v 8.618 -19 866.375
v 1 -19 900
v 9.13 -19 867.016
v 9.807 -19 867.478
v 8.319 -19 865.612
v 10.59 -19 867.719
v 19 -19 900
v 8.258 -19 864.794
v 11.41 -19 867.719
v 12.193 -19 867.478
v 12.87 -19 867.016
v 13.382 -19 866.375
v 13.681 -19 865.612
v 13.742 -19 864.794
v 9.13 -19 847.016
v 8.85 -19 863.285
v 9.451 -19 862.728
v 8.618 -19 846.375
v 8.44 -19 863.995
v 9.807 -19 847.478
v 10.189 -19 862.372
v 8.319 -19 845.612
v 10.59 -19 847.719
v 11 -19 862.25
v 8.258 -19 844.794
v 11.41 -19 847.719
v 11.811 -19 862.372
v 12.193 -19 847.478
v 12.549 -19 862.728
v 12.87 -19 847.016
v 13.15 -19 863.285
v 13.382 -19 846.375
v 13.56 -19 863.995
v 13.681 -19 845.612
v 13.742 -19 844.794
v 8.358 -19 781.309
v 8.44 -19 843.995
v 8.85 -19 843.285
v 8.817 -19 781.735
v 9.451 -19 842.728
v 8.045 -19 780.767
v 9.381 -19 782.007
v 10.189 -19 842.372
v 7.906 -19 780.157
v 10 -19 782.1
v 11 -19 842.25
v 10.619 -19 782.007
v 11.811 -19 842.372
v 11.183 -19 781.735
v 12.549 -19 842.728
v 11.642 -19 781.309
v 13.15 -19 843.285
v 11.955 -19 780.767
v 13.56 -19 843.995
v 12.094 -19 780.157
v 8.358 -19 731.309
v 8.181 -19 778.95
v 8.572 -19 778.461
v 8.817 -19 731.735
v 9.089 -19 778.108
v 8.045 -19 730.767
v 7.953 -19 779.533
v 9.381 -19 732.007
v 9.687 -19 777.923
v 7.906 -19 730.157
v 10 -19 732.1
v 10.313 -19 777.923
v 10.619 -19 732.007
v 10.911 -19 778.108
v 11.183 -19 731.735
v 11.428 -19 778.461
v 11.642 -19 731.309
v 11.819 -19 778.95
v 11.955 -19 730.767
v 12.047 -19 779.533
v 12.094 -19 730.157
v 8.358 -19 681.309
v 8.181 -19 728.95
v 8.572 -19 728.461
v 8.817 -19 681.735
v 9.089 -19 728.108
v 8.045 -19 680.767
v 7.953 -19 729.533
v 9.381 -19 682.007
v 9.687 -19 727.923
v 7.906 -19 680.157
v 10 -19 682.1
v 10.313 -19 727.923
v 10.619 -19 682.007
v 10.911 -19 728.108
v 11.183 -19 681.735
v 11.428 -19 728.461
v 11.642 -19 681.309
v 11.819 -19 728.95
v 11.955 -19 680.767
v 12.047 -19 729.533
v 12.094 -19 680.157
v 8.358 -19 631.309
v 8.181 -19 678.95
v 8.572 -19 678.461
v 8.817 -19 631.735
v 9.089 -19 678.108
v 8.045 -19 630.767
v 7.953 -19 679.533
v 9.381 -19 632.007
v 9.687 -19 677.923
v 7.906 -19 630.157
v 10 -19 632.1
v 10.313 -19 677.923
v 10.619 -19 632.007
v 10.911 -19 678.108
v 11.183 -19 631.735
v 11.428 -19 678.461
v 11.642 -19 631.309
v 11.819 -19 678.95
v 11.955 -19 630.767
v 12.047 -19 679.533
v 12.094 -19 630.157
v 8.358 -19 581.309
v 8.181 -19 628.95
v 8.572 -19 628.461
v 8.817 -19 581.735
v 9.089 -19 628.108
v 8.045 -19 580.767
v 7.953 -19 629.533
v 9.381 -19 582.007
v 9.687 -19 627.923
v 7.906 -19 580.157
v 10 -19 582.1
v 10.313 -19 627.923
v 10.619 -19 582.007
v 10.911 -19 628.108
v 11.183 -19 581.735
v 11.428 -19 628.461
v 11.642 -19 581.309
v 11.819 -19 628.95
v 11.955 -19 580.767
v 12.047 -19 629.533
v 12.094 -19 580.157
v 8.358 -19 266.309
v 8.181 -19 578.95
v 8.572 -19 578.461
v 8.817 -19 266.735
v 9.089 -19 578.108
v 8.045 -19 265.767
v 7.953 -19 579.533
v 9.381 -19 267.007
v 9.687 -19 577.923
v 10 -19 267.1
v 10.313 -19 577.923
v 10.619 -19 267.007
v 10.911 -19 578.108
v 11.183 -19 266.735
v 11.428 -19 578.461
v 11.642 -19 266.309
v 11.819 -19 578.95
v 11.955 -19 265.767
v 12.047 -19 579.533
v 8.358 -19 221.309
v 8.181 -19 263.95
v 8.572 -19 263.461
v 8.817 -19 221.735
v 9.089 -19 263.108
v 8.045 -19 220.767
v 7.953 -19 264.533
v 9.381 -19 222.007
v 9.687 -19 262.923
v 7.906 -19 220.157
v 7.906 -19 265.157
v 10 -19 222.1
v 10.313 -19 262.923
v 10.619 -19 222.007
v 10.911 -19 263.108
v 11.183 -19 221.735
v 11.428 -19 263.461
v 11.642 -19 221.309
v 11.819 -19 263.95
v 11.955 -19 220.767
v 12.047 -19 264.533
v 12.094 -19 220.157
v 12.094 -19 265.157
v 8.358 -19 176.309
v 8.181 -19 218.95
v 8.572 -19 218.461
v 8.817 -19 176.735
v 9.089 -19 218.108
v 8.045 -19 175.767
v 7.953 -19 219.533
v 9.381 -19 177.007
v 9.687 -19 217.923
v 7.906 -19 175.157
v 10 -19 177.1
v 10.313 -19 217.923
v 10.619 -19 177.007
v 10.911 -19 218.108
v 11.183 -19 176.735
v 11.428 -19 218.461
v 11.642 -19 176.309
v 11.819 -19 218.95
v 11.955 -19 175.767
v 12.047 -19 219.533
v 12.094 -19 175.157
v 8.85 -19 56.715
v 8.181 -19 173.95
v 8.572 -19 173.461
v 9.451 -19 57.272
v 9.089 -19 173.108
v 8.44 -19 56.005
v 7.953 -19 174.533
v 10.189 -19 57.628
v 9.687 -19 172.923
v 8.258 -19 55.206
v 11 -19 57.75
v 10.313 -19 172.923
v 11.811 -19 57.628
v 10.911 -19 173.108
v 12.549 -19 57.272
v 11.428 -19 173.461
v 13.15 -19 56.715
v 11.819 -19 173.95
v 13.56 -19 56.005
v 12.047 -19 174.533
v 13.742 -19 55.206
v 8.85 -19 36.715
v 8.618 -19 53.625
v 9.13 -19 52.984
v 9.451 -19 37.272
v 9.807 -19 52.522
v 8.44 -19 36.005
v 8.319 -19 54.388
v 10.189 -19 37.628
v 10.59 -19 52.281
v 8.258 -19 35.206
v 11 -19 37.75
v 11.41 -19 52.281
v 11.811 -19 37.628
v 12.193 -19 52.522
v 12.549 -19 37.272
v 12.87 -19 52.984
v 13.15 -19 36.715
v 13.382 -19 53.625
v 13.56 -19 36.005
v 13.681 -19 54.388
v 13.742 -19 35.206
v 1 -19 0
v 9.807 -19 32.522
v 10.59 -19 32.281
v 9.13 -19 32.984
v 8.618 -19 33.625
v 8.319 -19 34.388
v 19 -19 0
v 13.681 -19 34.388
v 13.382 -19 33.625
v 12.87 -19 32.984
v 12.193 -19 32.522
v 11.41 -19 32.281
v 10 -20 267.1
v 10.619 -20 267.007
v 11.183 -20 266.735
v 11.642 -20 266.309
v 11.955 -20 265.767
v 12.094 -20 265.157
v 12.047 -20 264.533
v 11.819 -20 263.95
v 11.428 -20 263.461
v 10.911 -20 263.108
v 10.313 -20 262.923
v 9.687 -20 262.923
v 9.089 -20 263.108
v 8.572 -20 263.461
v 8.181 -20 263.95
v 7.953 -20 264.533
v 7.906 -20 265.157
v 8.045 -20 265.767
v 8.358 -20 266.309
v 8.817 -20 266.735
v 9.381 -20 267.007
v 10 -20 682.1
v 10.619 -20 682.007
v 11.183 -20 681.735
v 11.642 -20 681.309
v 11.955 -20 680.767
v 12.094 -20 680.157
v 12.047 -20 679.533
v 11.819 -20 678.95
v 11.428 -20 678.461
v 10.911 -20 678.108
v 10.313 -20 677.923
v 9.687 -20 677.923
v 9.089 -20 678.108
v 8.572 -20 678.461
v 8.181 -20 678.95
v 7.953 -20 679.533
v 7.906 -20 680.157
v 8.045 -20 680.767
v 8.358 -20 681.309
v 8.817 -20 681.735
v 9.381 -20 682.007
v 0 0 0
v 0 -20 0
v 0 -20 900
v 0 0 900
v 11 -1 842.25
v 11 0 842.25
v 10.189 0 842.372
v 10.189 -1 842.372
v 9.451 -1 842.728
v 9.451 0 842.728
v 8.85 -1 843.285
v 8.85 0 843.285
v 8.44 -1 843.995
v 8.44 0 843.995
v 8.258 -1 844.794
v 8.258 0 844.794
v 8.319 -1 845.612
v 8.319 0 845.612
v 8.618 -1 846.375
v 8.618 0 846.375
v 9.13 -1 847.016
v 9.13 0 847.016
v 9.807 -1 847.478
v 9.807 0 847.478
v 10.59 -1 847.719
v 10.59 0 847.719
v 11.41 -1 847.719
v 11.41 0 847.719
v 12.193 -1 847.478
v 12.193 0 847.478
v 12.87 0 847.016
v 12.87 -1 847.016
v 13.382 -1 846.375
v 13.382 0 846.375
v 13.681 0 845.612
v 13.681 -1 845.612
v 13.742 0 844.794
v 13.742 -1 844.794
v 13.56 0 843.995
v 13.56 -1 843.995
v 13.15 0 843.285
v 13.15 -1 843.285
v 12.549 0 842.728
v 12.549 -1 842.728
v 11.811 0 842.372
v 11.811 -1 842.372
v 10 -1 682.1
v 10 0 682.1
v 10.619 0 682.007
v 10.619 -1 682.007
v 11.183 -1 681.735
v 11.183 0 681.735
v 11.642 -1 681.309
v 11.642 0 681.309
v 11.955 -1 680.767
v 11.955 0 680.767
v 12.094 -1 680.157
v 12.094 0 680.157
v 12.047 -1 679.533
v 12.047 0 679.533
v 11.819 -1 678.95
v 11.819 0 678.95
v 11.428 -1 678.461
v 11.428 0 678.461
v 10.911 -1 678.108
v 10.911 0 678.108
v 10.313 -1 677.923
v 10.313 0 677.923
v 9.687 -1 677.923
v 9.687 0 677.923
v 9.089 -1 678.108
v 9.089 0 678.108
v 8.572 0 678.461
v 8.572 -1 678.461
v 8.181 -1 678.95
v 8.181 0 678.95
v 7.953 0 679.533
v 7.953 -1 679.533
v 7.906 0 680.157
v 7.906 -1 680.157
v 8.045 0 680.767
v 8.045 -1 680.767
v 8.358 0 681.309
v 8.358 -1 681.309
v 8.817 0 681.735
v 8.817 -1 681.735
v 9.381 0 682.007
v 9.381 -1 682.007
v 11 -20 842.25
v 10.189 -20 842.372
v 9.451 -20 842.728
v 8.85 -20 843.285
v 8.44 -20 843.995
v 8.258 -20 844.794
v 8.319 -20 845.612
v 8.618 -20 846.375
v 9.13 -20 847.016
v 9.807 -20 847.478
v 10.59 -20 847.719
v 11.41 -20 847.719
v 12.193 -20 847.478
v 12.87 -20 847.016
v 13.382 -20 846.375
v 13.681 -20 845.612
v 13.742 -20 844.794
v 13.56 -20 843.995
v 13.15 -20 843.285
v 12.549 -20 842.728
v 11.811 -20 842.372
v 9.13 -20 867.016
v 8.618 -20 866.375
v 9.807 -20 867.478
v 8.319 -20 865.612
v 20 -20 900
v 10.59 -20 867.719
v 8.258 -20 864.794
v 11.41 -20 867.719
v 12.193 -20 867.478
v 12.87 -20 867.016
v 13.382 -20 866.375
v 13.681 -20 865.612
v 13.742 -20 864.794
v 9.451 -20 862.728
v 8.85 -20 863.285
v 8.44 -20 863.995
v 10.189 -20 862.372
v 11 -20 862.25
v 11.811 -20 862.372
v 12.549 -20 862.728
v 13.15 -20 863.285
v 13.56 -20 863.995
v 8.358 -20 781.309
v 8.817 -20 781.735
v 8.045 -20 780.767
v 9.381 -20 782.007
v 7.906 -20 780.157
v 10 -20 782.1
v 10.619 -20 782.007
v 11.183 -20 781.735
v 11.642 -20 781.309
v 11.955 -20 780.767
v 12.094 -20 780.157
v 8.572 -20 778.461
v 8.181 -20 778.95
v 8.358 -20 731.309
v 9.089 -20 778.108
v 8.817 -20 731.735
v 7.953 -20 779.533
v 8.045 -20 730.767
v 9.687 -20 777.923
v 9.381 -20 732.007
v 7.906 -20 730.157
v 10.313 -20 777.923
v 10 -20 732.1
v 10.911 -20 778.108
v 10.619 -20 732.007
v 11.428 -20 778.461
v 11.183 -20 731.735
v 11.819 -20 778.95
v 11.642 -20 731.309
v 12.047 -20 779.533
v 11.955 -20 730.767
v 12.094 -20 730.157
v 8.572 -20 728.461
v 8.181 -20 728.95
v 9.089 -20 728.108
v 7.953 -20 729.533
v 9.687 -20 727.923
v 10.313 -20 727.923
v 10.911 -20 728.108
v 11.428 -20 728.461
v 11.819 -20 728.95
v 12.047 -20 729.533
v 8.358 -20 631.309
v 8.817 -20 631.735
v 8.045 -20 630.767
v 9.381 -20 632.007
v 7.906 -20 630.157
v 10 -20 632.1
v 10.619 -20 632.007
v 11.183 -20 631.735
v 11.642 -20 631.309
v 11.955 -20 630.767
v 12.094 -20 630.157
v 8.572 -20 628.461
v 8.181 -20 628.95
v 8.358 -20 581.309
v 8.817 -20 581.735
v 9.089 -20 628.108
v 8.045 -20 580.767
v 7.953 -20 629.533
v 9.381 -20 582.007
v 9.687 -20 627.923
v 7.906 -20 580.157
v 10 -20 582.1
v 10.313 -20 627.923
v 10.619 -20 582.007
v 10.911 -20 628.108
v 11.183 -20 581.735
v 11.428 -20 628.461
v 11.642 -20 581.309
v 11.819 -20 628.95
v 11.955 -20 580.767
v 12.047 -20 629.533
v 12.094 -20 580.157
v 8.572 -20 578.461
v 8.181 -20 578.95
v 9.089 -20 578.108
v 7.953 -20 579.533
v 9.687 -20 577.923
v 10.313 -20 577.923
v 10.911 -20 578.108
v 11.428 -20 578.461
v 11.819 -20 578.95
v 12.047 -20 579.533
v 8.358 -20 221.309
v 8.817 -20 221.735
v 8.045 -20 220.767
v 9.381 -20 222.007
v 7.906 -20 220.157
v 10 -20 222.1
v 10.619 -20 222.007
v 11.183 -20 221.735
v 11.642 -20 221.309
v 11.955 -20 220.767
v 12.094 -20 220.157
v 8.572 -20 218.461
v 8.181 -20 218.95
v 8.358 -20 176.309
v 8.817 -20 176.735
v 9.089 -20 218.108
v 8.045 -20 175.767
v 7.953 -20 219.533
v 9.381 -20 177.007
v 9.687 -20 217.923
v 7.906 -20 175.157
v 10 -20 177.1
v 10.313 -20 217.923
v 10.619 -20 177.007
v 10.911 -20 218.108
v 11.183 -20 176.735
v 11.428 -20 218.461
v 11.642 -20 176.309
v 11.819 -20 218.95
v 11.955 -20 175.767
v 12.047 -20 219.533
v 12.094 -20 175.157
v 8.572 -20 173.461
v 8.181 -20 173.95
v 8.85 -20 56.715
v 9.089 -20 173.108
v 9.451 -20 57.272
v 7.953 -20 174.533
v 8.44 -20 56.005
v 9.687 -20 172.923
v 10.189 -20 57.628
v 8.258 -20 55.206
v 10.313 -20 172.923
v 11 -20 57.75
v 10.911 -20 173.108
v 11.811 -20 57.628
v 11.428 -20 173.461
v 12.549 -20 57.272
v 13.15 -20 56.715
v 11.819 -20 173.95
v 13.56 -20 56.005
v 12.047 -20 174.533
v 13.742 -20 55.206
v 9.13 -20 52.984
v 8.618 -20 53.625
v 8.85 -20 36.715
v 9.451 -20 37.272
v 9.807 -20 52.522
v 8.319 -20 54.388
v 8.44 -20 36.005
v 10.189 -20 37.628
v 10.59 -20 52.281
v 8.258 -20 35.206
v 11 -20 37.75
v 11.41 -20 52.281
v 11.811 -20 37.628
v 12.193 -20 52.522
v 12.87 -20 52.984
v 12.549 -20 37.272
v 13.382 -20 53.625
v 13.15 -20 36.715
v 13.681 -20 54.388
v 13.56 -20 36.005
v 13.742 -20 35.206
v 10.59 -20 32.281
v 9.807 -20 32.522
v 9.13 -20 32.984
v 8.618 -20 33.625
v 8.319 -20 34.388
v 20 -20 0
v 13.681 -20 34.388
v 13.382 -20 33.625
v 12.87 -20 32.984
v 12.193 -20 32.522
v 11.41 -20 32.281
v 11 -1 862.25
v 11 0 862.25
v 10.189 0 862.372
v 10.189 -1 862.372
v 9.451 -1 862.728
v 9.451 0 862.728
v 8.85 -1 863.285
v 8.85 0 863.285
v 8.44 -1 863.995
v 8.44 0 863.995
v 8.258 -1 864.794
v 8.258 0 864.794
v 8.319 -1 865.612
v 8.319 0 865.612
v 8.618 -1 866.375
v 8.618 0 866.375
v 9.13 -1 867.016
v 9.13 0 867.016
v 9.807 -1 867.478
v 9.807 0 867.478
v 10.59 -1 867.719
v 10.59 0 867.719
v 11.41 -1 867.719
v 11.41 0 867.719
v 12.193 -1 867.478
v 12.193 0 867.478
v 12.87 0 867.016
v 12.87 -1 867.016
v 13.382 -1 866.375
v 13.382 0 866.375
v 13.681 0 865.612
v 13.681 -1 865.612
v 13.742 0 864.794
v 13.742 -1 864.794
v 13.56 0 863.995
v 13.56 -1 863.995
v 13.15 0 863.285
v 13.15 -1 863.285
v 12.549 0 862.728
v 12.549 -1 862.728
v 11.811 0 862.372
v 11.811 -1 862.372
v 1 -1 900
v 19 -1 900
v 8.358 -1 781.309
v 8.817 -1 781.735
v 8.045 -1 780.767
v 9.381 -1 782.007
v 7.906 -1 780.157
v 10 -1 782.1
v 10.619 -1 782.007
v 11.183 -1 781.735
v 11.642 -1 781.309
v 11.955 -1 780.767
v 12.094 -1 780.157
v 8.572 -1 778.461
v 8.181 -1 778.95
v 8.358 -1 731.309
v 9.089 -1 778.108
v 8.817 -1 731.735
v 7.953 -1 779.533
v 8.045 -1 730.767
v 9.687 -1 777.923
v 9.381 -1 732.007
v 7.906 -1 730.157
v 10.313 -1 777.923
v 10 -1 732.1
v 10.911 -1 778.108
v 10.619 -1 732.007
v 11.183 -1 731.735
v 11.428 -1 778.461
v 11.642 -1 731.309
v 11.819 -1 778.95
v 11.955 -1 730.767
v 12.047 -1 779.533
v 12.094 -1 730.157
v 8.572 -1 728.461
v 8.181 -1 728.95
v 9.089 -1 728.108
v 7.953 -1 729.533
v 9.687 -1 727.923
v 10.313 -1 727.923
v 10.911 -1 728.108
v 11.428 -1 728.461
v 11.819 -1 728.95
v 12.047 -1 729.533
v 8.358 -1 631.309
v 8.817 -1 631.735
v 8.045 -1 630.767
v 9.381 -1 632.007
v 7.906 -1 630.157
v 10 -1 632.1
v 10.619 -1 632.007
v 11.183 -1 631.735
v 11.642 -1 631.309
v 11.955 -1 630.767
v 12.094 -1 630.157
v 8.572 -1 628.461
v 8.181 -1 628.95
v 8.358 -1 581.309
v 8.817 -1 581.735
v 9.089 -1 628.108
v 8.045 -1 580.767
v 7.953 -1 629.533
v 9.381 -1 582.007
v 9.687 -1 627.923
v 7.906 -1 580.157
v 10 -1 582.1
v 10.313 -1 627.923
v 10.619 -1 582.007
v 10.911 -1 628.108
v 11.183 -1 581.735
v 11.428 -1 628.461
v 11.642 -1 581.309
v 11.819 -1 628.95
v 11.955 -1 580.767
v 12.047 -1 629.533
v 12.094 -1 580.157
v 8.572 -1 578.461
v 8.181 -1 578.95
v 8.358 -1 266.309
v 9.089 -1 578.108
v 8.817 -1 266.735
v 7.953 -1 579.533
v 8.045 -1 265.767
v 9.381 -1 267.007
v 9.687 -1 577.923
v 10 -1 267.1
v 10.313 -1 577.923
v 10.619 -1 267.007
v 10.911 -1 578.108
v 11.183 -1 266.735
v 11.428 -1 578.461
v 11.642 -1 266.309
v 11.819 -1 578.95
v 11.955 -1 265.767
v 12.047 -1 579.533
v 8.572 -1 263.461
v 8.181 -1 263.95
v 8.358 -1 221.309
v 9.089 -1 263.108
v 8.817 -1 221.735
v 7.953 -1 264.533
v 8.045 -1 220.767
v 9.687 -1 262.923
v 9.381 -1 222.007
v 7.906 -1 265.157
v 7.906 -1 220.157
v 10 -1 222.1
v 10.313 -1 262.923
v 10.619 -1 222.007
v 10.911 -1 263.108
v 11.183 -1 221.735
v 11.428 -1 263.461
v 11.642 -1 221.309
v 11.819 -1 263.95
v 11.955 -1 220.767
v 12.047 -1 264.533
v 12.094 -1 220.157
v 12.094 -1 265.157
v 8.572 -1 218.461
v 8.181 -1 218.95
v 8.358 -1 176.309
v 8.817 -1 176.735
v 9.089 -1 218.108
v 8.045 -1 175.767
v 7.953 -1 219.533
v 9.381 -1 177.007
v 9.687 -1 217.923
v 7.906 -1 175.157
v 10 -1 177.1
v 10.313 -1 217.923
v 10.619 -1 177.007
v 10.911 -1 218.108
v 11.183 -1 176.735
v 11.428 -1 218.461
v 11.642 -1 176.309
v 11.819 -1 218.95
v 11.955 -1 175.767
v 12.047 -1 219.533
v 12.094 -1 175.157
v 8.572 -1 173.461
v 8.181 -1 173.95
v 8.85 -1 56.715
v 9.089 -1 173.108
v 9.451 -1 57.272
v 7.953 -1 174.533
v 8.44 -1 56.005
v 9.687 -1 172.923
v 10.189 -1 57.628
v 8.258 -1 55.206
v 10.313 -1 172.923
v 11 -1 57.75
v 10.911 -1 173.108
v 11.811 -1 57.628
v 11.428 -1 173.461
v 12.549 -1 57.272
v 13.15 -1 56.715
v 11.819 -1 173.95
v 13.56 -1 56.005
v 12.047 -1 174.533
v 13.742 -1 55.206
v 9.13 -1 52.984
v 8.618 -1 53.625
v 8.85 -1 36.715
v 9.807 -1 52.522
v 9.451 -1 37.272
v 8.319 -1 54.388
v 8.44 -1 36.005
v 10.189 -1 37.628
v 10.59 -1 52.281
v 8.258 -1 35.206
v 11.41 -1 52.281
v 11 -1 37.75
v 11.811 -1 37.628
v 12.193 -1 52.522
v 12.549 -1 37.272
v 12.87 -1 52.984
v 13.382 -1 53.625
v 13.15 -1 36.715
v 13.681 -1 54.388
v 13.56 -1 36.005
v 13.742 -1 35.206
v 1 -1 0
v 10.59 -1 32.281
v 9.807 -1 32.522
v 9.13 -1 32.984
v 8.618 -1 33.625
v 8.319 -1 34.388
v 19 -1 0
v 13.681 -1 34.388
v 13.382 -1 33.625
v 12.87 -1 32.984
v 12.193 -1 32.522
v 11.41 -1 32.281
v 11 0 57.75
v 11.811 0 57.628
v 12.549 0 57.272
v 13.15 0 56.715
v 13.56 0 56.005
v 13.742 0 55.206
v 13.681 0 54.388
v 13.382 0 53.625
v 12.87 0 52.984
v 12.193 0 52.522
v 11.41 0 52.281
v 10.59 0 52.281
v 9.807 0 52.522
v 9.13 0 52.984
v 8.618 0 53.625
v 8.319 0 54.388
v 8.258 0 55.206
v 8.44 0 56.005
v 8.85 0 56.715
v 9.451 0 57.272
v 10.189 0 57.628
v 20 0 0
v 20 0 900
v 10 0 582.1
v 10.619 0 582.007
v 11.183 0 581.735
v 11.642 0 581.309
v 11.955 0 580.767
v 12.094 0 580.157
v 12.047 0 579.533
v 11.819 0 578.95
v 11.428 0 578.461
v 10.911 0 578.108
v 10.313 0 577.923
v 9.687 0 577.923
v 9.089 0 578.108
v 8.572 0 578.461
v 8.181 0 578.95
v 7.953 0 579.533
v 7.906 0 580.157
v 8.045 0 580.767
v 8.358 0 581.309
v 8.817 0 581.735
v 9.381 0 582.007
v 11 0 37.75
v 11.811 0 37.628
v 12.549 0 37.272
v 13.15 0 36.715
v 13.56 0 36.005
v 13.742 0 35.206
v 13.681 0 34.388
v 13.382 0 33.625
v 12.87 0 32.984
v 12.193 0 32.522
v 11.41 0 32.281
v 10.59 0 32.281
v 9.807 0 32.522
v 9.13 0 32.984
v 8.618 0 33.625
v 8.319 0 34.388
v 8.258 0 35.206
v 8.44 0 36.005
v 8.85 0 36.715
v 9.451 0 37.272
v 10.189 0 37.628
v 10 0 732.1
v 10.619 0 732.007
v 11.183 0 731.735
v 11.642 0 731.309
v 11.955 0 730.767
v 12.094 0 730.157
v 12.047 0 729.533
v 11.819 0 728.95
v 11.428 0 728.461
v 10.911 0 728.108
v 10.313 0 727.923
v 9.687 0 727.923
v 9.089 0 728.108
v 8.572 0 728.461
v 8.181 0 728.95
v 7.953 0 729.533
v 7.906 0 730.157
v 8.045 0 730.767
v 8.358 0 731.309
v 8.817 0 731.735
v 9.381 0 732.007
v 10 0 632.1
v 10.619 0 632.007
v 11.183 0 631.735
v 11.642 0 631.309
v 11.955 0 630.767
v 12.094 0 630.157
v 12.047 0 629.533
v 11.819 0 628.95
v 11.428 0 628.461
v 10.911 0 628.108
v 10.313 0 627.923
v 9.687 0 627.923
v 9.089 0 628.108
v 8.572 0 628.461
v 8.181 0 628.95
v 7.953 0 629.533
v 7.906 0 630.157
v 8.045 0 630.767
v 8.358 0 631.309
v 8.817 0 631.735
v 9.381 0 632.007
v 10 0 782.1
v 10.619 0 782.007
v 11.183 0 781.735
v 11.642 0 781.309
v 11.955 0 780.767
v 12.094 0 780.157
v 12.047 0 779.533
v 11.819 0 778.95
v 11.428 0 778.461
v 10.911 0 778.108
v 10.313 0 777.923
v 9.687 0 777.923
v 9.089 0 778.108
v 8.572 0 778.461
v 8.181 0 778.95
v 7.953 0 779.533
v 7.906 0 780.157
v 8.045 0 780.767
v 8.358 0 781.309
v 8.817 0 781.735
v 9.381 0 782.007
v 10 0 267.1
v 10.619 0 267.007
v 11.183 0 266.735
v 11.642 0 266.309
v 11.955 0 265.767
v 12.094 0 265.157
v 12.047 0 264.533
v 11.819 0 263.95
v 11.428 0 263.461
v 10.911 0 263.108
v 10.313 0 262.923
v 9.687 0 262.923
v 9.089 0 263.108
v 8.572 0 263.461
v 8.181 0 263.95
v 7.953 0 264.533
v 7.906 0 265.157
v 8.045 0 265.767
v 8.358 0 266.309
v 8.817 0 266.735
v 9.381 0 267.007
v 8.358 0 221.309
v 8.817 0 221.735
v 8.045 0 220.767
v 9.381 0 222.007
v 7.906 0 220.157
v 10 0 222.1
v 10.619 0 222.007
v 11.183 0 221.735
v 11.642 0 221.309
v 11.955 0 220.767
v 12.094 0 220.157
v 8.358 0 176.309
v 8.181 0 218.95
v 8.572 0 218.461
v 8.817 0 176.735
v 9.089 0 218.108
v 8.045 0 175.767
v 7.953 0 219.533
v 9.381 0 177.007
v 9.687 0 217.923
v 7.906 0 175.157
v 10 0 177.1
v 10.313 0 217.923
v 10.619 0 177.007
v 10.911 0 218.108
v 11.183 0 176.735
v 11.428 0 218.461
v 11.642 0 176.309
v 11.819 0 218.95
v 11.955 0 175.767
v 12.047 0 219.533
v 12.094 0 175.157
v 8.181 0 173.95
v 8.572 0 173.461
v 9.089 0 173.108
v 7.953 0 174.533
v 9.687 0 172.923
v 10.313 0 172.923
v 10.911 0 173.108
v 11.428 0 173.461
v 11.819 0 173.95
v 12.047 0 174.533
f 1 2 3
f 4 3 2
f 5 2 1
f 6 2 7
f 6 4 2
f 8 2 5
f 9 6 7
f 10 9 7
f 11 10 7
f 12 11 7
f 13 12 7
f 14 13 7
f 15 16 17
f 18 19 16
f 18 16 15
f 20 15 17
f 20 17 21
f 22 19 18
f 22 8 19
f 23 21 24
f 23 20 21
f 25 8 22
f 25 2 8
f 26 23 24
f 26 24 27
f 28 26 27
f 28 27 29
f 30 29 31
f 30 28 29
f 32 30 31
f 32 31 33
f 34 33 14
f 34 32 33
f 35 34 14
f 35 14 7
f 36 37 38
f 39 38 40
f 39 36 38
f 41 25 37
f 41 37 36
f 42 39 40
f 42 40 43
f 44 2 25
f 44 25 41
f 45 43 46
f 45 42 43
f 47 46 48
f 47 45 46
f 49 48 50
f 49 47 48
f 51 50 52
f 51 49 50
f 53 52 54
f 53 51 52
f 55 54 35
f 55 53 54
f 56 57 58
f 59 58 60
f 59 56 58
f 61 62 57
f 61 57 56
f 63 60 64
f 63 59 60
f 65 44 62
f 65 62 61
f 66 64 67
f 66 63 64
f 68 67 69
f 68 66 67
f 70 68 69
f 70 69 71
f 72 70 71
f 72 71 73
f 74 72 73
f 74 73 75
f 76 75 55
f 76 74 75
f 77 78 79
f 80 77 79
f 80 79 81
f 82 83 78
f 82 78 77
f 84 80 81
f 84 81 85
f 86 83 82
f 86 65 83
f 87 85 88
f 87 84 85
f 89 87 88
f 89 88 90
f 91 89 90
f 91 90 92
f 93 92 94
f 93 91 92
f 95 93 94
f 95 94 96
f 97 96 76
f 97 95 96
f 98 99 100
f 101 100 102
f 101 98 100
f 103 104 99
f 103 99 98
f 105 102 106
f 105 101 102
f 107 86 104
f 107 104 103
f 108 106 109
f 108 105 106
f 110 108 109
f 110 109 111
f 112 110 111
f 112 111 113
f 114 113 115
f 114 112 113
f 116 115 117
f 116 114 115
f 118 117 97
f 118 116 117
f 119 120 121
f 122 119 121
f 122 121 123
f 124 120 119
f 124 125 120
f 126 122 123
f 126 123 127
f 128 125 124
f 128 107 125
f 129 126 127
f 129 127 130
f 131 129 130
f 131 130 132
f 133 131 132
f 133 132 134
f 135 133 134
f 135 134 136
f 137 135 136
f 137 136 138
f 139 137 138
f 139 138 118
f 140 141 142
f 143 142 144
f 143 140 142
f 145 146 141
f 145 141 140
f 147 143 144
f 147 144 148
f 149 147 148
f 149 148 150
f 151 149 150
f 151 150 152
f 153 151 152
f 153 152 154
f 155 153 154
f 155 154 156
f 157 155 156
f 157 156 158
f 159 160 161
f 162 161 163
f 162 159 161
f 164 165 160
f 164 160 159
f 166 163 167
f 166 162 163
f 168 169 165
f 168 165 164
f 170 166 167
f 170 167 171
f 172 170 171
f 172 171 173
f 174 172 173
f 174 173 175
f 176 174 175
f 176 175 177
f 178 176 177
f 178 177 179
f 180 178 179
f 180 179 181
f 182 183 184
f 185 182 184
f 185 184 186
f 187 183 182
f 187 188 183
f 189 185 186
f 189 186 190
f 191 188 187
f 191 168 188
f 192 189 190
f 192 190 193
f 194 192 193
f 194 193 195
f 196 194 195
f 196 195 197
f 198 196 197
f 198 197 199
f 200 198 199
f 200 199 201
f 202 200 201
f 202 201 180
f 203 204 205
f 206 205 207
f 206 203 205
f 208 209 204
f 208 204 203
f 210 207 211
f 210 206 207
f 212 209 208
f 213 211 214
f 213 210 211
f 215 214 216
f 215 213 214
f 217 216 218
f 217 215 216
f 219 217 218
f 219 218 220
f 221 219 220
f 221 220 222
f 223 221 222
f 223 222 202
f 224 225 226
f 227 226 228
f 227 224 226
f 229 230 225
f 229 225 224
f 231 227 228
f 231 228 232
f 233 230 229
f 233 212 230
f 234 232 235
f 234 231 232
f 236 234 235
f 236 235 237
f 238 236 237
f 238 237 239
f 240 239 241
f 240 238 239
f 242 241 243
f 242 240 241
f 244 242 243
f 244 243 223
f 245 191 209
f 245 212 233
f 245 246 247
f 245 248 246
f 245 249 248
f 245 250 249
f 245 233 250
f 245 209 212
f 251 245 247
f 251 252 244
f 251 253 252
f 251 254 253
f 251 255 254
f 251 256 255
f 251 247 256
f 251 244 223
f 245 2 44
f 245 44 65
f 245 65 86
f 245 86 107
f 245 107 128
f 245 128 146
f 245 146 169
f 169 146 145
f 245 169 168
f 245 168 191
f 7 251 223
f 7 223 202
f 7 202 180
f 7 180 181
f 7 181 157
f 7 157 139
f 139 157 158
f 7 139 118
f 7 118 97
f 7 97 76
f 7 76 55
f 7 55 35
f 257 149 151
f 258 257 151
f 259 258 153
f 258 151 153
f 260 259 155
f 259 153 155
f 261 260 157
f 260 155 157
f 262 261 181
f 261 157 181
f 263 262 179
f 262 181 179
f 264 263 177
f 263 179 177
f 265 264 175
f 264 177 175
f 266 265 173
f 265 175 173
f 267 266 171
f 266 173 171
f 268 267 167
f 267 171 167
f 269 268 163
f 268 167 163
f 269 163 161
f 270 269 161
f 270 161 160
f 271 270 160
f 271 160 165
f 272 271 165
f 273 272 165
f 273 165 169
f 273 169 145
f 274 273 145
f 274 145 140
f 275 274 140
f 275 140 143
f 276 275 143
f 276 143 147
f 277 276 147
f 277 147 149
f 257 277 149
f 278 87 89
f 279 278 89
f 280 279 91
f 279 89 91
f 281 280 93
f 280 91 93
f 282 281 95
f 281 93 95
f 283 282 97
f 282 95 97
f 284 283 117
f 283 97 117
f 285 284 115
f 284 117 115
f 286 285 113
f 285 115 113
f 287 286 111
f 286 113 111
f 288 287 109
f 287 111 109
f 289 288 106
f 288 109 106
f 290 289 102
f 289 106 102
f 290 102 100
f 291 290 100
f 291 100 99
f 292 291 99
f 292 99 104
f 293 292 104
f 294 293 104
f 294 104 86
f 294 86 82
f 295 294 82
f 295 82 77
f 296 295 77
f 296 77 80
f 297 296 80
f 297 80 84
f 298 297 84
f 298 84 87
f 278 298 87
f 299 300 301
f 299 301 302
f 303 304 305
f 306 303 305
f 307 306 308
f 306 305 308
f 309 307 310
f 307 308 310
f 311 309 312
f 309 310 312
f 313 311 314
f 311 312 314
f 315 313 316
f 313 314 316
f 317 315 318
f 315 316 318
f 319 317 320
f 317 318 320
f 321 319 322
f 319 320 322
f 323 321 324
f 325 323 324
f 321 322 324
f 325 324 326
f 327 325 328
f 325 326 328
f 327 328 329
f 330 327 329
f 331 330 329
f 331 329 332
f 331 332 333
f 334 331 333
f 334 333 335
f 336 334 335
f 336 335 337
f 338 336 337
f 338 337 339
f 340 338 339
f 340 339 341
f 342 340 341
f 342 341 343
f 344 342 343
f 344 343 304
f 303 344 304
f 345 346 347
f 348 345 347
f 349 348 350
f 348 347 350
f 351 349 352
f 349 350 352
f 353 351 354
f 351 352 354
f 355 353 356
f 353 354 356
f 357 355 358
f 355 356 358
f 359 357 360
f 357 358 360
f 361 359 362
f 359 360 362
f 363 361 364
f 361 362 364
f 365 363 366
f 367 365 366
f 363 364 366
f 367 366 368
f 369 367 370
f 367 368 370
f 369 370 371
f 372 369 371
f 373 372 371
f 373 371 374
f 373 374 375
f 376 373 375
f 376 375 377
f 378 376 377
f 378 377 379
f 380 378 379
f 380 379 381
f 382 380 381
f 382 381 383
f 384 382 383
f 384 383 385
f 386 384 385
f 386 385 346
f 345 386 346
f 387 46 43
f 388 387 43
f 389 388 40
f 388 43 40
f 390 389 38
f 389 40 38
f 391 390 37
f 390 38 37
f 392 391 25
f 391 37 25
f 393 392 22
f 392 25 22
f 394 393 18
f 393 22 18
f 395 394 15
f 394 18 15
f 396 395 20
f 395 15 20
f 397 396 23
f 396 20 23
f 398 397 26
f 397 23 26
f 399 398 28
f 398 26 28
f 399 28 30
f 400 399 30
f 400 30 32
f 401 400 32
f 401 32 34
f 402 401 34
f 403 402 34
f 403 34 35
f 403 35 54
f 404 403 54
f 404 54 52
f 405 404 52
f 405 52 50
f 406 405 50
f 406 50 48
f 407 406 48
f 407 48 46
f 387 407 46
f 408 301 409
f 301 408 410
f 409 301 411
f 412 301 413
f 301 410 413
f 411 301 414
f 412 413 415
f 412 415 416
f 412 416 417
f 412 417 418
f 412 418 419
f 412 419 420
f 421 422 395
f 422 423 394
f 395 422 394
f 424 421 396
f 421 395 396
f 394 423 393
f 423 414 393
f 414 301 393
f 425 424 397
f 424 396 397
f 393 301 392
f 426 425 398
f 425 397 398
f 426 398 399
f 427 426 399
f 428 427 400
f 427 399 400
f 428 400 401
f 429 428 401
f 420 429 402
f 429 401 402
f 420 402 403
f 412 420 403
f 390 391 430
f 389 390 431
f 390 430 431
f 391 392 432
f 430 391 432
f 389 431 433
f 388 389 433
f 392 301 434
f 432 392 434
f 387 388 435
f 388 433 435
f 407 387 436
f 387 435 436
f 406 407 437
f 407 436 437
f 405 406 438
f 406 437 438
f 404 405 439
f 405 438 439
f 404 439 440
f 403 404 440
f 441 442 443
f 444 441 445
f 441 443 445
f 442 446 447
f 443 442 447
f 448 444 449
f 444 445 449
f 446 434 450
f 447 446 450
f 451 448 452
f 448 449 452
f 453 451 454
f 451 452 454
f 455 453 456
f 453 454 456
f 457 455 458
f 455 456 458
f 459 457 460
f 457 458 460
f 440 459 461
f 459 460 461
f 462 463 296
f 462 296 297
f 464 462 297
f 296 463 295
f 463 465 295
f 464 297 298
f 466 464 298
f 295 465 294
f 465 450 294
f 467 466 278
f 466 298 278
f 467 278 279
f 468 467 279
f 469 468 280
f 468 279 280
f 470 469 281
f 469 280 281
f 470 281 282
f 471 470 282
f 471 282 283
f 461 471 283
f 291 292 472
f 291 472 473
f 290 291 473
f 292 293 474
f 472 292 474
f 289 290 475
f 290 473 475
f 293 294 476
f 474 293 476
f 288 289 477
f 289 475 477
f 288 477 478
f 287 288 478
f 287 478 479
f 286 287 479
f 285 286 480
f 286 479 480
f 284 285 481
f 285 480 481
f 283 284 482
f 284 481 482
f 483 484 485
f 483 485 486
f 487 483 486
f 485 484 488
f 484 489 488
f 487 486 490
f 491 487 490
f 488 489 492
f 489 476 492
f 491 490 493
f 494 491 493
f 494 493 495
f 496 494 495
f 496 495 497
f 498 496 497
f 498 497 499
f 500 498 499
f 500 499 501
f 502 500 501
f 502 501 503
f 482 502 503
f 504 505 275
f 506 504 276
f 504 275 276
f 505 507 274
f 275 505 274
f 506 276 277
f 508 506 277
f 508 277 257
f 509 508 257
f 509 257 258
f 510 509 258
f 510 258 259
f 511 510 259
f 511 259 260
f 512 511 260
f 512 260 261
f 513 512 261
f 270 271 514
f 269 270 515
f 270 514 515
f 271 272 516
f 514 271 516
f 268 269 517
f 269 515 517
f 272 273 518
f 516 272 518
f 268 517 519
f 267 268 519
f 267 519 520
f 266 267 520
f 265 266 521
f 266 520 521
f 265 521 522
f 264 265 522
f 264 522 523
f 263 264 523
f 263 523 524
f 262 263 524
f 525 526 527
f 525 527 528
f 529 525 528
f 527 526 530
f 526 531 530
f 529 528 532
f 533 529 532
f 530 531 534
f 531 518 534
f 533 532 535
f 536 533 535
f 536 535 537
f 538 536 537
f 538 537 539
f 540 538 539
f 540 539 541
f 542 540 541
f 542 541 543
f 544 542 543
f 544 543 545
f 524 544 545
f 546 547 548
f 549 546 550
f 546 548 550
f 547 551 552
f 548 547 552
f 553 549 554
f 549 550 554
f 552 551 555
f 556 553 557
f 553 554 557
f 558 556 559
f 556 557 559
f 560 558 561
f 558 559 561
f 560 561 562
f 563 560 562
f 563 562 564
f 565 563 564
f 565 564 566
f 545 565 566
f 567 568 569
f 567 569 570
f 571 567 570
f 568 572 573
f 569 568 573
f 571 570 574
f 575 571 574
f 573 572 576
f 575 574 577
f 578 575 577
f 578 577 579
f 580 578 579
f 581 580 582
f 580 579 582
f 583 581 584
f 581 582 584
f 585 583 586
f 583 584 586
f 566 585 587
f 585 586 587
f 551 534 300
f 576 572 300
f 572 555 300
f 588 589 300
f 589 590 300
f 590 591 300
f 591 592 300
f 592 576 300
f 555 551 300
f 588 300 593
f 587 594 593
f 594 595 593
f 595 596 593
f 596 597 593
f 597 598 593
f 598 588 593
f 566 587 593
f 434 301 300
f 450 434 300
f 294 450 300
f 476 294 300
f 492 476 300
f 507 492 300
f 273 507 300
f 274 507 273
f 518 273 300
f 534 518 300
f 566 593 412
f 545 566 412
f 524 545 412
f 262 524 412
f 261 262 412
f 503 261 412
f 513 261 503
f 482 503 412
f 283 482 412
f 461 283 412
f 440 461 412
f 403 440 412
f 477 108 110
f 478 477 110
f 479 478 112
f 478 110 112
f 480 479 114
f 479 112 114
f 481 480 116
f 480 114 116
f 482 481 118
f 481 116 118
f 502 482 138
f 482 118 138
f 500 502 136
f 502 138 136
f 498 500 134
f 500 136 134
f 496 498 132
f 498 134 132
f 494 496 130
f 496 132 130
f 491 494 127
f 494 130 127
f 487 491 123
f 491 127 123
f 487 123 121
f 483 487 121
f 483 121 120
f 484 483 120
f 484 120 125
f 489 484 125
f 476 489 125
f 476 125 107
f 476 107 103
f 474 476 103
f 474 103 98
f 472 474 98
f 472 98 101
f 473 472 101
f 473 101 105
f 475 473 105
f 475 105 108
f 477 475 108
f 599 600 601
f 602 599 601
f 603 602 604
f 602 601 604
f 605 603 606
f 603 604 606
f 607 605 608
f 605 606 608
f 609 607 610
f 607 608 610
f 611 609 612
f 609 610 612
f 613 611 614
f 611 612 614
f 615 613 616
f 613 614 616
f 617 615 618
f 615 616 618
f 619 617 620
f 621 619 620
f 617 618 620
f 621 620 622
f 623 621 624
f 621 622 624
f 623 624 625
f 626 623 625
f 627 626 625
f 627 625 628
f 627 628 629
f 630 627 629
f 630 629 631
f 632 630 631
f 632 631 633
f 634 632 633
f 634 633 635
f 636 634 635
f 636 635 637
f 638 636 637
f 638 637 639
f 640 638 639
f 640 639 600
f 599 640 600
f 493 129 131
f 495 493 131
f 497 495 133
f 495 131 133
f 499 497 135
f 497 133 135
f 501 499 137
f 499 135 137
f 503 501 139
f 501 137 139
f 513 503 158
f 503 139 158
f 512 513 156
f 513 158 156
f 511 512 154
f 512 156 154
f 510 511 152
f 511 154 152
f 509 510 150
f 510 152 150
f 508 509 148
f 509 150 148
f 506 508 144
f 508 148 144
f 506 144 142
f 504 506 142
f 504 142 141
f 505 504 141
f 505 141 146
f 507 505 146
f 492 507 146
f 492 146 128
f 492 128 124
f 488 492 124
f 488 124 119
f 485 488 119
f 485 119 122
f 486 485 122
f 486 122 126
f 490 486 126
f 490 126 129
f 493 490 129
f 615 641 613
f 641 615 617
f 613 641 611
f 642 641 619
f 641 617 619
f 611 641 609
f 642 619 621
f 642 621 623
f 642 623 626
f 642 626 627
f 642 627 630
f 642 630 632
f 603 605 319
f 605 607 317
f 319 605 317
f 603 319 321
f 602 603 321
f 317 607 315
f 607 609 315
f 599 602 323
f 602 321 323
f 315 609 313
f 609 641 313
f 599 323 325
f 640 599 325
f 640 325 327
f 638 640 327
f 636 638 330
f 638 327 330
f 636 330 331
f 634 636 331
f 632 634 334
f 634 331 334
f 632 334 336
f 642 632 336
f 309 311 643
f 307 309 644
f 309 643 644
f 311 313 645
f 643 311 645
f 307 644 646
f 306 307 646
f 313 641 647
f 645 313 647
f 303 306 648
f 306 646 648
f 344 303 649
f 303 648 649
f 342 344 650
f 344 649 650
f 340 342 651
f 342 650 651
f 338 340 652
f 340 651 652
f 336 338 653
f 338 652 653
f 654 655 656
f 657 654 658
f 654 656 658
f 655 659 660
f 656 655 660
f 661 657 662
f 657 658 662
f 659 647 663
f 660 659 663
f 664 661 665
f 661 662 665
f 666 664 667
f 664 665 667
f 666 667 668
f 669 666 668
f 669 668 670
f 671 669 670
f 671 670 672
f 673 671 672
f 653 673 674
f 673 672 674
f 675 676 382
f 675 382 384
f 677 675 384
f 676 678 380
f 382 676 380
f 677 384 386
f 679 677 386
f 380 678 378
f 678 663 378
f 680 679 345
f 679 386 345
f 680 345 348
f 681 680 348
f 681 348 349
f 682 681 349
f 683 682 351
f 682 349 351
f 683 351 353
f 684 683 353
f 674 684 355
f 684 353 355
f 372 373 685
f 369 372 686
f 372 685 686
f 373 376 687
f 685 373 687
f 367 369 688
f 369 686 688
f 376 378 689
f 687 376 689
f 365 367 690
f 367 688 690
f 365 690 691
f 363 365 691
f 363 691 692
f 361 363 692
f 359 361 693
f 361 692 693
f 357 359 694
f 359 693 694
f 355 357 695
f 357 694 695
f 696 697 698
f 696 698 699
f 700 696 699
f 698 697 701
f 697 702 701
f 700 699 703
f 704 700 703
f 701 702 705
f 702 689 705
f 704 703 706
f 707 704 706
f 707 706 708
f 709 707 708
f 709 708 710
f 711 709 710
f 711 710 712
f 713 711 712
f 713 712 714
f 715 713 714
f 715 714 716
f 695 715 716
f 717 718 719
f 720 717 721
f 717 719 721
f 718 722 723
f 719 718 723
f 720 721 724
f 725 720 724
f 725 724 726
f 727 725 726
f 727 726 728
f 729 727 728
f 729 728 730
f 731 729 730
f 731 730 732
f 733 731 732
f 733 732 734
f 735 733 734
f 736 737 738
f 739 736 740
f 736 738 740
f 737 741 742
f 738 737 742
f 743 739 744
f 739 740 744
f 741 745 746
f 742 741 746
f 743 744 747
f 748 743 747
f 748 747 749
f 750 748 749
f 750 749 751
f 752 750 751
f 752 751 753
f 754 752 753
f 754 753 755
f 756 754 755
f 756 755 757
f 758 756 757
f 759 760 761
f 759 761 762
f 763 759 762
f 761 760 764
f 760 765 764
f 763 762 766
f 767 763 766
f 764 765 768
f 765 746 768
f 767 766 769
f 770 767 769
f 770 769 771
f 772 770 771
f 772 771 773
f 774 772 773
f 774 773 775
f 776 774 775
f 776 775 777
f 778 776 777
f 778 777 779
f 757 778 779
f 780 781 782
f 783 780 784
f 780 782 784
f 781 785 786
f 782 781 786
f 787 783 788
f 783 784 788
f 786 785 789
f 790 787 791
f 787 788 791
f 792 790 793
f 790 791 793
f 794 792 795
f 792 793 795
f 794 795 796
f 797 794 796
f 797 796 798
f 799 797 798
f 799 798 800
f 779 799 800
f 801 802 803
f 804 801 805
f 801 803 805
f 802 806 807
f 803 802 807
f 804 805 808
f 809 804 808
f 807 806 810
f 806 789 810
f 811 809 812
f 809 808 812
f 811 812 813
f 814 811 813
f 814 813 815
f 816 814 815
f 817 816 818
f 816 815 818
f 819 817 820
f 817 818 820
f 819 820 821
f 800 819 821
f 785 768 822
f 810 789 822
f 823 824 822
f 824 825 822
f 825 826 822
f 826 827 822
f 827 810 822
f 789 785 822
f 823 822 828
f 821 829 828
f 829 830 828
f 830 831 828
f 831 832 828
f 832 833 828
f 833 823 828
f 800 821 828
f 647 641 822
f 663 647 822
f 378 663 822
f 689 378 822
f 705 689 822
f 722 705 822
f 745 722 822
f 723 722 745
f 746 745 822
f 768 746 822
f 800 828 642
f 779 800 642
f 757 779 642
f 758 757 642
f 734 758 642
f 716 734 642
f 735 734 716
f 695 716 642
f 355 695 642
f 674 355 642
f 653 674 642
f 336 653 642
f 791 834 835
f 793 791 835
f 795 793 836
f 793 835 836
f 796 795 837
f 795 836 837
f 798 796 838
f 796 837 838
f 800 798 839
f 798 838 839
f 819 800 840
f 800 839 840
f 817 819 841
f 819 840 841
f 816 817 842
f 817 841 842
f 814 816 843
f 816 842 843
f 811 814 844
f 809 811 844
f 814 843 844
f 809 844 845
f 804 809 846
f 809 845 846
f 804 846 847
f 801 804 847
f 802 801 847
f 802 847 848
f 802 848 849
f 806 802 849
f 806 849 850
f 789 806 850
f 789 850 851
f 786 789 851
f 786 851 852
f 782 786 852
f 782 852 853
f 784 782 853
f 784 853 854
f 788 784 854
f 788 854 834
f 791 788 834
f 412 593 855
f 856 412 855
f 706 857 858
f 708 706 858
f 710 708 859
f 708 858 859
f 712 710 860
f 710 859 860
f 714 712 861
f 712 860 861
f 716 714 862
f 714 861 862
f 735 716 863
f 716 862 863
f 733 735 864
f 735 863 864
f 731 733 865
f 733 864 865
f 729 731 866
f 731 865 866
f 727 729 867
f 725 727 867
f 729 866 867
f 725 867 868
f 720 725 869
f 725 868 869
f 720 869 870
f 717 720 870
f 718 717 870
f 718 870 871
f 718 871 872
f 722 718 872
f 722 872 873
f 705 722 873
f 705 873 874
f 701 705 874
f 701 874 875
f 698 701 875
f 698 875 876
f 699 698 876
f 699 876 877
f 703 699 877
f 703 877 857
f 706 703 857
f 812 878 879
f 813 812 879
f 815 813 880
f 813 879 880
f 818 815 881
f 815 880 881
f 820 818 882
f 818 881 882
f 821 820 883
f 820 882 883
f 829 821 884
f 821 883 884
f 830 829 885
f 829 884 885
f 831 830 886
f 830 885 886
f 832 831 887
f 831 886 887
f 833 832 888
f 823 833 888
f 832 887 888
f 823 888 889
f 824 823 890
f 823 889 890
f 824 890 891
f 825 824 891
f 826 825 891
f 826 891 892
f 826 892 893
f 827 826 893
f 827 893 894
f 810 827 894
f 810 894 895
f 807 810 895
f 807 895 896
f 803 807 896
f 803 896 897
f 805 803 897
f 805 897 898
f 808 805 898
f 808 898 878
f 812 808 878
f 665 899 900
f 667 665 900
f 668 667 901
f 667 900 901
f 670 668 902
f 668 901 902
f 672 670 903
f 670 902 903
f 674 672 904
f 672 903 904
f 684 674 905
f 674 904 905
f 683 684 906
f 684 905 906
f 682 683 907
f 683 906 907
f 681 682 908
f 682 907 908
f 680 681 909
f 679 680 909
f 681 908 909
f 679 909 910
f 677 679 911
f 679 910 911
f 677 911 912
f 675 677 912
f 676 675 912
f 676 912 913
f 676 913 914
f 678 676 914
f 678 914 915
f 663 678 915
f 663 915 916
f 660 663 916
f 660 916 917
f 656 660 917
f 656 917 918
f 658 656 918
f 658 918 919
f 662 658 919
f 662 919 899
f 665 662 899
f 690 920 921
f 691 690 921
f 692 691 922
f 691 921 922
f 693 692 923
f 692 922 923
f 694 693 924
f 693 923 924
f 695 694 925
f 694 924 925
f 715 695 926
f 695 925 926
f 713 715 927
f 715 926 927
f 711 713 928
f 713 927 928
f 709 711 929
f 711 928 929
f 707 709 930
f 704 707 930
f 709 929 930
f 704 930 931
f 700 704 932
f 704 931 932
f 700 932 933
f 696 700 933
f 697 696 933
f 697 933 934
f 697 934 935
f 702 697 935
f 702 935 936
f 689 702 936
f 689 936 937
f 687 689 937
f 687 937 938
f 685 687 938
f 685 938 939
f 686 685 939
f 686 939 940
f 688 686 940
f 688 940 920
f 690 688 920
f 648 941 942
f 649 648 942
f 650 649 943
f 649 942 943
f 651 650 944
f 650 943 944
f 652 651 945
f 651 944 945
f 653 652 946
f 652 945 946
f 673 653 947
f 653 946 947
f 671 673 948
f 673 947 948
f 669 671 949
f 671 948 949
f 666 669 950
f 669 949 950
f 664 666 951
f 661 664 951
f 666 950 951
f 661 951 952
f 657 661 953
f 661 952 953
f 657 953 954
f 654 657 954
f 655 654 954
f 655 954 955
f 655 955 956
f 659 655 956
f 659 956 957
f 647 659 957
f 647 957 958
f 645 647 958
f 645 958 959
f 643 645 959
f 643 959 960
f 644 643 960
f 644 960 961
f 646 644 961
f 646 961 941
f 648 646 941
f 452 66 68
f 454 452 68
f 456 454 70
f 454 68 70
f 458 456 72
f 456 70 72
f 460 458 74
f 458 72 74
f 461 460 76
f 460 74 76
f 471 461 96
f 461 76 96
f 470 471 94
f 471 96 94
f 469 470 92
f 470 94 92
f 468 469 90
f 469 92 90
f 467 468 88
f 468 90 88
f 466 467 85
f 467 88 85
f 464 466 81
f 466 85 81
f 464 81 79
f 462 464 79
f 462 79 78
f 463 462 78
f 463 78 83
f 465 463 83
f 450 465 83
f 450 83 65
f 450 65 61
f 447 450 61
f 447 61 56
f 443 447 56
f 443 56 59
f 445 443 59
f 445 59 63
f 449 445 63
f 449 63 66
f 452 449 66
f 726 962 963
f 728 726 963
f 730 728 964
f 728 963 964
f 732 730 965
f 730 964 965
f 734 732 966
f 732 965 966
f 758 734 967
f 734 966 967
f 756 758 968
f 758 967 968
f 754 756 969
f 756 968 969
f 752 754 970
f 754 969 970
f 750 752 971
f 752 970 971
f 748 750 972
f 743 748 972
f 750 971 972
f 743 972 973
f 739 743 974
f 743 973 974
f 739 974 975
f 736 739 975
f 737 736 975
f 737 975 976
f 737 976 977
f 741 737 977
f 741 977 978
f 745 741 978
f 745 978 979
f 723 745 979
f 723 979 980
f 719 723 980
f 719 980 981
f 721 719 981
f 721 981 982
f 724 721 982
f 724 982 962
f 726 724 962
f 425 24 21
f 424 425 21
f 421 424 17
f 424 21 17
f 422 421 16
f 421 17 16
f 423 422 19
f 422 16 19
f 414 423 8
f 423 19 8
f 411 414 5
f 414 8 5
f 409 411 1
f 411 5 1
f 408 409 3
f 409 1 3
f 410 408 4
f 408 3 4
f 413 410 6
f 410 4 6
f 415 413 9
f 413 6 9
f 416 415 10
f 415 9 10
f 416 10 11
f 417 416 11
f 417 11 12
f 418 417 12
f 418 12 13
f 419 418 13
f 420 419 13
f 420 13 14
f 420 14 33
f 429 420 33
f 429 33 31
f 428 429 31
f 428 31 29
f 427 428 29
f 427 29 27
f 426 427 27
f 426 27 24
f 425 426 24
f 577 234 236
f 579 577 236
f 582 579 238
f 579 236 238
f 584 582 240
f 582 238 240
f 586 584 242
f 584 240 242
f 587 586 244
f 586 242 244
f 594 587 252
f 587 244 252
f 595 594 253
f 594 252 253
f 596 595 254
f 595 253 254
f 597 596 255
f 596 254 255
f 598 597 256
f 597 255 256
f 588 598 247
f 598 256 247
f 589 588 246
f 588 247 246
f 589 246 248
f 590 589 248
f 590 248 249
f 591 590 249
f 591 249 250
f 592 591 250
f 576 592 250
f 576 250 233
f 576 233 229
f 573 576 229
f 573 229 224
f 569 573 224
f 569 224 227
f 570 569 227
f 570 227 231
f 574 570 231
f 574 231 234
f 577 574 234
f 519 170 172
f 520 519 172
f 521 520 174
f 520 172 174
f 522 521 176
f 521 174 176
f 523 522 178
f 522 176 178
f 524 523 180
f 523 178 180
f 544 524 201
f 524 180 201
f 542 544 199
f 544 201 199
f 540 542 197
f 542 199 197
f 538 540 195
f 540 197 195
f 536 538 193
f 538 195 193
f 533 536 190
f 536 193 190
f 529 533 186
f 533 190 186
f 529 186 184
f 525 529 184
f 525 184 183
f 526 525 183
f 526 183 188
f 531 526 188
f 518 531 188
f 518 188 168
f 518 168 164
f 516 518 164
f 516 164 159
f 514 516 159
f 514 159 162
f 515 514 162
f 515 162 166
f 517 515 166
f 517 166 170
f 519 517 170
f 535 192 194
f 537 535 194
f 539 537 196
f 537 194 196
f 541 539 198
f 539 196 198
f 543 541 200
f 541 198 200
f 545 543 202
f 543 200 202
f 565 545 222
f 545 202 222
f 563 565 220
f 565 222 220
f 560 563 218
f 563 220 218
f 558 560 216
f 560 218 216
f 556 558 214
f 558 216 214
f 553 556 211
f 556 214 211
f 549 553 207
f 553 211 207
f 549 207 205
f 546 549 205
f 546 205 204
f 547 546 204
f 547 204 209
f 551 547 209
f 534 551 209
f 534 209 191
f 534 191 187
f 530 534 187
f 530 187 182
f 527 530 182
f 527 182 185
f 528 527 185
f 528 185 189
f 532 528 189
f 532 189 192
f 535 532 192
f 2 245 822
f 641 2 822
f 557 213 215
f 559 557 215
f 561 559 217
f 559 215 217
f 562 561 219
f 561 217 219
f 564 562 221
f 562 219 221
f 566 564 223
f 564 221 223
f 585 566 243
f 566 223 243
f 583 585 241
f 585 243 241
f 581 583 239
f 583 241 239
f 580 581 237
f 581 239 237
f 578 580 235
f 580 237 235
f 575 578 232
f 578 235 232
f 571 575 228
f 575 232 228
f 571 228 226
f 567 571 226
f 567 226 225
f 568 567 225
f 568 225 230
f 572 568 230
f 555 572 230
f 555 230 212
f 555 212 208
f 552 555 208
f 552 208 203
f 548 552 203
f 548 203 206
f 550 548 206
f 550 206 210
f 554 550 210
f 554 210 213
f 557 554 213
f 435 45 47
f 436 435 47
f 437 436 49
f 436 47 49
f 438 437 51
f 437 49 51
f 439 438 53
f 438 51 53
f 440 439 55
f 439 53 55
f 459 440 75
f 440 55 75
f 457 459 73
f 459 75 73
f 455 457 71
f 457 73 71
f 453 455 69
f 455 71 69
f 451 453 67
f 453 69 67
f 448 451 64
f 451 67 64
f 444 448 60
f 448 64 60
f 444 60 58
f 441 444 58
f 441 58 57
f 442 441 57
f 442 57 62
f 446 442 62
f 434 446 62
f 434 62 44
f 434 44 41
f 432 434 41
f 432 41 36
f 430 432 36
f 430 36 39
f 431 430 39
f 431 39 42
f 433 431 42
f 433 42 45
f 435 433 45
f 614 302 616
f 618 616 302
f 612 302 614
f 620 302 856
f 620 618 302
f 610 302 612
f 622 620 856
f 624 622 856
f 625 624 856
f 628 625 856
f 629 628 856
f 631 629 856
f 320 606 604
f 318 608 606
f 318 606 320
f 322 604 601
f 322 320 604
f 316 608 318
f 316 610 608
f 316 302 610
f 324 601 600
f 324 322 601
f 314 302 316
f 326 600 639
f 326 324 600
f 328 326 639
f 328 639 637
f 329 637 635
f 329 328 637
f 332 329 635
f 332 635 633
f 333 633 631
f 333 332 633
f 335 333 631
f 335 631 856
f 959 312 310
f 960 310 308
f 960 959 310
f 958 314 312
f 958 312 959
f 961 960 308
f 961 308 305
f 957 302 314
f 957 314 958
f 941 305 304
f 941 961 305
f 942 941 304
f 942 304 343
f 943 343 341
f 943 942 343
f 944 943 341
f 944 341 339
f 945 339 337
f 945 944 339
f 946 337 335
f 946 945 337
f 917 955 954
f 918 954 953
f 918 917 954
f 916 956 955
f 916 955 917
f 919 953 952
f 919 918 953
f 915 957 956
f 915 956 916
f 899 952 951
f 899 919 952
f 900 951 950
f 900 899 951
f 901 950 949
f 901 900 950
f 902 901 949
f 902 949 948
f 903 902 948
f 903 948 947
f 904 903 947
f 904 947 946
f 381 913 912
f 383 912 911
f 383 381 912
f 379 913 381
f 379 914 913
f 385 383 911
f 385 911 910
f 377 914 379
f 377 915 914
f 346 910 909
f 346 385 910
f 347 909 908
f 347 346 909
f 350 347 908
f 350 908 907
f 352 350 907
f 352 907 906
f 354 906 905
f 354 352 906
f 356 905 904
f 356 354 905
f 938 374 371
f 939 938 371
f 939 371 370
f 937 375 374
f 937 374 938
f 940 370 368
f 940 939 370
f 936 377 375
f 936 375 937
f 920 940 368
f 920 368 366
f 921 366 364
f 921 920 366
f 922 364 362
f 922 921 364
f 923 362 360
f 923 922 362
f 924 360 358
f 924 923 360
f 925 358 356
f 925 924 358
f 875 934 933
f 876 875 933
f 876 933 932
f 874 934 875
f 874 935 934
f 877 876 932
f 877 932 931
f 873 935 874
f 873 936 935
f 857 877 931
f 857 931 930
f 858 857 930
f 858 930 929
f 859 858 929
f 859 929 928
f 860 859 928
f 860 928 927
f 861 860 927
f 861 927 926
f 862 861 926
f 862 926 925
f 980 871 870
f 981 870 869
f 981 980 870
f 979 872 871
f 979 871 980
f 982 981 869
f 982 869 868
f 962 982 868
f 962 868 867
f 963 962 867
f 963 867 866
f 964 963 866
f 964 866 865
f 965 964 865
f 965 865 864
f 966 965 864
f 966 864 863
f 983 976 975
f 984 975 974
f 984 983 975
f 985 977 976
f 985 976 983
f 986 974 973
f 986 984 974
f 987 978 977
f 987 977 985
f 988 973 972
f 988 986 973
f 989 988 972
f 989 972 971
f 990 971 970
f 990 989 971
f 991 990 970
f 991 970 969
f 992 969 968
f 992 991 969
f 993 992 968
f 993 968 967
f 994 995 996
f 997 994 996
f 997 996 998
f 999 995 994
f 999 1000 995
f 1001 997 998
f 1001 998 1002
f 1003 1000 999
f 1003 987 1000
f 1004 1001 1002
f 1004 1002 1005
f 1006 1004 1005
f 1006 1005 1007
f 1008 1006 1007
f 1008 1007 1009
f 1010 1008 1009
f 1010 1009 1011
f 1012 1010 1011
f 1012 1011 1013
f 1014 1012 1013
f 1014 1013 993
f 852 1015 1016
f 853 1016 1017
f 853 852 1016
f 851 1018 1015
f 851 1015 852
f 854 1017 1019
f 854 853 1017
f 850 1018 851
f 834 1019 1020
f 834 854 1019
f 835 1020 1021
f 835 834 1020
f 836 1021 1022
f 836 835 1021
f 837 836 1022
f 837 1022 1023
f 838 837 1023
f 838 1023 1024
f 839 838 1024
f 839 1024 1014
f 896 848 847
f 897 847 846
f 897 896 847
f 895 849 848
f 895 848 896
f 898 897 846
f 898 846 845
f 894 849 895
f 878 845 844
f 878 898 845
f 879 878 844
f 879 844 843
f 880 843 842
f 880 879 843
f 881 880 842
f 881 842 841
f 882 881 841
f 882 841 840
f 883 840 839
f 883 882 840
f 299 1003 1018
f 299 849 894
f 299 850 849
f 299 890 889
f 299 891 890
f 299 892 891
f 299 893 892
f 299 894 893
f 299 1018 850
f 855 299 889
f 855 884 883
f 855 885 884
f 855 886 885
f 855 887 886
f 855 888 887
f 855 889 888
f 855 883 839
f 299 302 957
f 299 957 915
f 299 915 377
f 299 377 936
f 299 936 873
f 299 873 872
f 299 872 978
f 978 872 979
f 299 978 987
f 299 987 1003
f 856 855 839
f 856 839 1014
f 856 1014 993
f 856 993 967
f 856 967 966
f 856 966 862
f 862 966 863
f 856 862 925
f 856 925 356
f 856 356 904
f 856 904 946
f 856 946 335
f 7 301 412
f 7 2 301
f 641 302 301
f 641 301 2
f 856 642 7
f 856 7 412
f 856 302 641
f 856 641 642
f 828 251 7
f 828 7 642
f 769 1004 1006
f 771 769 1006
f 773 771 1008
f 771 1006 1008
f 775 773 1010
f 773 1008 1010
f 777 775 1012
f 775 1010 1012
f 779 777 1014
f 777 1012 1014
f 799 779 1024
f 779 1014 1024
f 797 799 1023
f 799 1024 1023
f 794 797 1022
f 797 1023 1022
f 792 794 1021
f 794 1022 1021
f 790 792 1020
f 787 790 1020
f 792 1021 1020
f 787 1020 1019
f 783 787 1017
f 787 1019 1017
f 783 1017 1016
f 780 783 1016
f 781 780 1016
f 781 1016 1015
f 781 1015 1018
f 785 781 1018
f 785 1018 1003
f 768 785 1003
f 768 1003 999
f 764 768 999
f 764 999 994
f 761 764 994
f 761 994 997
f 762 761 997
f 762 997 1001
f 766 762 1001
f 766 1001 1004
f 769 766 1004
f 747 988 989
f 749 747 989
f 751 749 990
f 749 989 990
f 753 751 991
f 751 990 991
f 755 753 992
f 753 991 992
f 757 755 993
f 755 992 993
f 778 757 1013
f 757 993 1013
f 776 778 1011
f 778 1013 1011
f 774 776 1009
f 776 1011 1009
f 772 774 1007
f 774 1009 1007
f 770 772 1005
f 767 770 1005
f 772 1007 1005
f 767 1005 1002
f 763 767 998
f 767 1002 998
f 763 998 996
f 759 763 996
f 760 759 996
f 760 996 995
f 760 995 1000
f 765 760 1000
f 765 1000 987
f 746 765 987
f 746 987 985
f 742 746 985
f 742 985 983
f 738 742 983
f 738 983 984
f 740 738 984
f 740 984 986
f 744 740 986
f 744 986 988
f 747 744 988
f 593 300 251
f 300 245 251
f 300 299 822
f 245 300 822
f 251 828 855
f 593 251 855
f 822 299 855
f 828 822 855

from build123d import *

# Parameters (mm, degrees)
SKETCH_1_W          = 20
SKETCH_1_H          = 20
SKETCH_1_W_2        = 18
SKETCH_1_H_2        = 18
EXTRUDE_1_DEPTH     = 900
SKETCH_2_R          = 2.75
CUT_EXTRUDE_1_DEPTH = 37
SKETCH_3_R          = 2.1
CUT_EXTRUDE_2_DEPTH = 37
SKETCH_4_R          = 2.1
CUT_EXTRUDE_3_DEPTH = 37


with BuildPart() as part:
    # 草图1 → 拉伸-薄壁1 (new body)
    with BuildSketch(Plane.XY):
        with Locations((10, -10)):
            Rectangle(SKETCH_1_W, SKETCH_1_H)
        with Locations((10, -10)):
            Rectangle(SKETCH_1_W_2, SKETCH_1_H_2, mode=Mode.SUBTRACT)
    extrude(amount=EXTRUDE_1_DEPTH)

    # 草图2 → 切除-拉伸1 (cut)
    with BuildSketch(Plane(origin=(0, 0, 0), x_dir=(1, 0, 0), z_dir=(0, 1, 0))):
        with Locations(Location((11, -35, 0), (0, 0, 270))):
            Circle(SKETCH_2_R)
        with Locations(Location((11, -55, 0), (0, 0, 270))):
            Circle(SKETCH_2_R)
        with Locations(Location((11, -845, 0), (0, 0, 90))):
            Circle(SKETCH_2_R)
        with Locations(Location((11, -865, 0), (0, 0, 90))):
            Circle(SKETCH_2_R)
    extrude(amount=-CUT_EXTRUDE_1_DEPTH, mode=Mode.SUBTRACT)

    # 草图3 → 切除-拉伸2 (cut)
    with BuildSketch(Plane(origin=(0, 0, 0), x_dir=(1, 0, 0), z_dir=(0, 1, 0))):
        with Locations(Location((10, -175, 0), (0, 0, 270))):
            Circle(SKETCH_3_R)
        with Locations(Location((10, -220, 0), (0, 0, 270))):
            Circle(SKETCH_3_R)
        with Locations(Location((10, -265, 0), (0, 0, 270))):
            Circle(SKETCH_3_R)
    extrude(amount=-CUT_EXTRUDE_2_DEPTH, mode=Mode.SUBTRACT)

    # 草图4 → 切除-拉伸3 (cut)
    with BuildSketch(Plane(origin=(0, 0, 0), x_dir=(1, 0, 0), z_dir=(0, 1, 0))):
        with Locations(Location((10, -780, 0), (0, 0, 270))):
            Circle(SKETCH_4_R)
        with Locations(Location((10, -730, 0), (0, 0, 270))):
            Circle(SKETCH_4_R)
        with Locations(Location((10, -680, 0), (0, 0, 270))):
            Circle(SKETCH_4_R)
        with Locations(Location((10, -630, 0), (0, 0, 270))):
            Circle(SKETCH_4_R)
        with Locations(Location((10, -580, 0), (0, 0, 270))):
            Circle(SKETCH_4_R)
    extrude(amount=-CUT_EXTRUDE_3_DEPTH, mode=Mode.SUBTRACT)


solid = part.part
